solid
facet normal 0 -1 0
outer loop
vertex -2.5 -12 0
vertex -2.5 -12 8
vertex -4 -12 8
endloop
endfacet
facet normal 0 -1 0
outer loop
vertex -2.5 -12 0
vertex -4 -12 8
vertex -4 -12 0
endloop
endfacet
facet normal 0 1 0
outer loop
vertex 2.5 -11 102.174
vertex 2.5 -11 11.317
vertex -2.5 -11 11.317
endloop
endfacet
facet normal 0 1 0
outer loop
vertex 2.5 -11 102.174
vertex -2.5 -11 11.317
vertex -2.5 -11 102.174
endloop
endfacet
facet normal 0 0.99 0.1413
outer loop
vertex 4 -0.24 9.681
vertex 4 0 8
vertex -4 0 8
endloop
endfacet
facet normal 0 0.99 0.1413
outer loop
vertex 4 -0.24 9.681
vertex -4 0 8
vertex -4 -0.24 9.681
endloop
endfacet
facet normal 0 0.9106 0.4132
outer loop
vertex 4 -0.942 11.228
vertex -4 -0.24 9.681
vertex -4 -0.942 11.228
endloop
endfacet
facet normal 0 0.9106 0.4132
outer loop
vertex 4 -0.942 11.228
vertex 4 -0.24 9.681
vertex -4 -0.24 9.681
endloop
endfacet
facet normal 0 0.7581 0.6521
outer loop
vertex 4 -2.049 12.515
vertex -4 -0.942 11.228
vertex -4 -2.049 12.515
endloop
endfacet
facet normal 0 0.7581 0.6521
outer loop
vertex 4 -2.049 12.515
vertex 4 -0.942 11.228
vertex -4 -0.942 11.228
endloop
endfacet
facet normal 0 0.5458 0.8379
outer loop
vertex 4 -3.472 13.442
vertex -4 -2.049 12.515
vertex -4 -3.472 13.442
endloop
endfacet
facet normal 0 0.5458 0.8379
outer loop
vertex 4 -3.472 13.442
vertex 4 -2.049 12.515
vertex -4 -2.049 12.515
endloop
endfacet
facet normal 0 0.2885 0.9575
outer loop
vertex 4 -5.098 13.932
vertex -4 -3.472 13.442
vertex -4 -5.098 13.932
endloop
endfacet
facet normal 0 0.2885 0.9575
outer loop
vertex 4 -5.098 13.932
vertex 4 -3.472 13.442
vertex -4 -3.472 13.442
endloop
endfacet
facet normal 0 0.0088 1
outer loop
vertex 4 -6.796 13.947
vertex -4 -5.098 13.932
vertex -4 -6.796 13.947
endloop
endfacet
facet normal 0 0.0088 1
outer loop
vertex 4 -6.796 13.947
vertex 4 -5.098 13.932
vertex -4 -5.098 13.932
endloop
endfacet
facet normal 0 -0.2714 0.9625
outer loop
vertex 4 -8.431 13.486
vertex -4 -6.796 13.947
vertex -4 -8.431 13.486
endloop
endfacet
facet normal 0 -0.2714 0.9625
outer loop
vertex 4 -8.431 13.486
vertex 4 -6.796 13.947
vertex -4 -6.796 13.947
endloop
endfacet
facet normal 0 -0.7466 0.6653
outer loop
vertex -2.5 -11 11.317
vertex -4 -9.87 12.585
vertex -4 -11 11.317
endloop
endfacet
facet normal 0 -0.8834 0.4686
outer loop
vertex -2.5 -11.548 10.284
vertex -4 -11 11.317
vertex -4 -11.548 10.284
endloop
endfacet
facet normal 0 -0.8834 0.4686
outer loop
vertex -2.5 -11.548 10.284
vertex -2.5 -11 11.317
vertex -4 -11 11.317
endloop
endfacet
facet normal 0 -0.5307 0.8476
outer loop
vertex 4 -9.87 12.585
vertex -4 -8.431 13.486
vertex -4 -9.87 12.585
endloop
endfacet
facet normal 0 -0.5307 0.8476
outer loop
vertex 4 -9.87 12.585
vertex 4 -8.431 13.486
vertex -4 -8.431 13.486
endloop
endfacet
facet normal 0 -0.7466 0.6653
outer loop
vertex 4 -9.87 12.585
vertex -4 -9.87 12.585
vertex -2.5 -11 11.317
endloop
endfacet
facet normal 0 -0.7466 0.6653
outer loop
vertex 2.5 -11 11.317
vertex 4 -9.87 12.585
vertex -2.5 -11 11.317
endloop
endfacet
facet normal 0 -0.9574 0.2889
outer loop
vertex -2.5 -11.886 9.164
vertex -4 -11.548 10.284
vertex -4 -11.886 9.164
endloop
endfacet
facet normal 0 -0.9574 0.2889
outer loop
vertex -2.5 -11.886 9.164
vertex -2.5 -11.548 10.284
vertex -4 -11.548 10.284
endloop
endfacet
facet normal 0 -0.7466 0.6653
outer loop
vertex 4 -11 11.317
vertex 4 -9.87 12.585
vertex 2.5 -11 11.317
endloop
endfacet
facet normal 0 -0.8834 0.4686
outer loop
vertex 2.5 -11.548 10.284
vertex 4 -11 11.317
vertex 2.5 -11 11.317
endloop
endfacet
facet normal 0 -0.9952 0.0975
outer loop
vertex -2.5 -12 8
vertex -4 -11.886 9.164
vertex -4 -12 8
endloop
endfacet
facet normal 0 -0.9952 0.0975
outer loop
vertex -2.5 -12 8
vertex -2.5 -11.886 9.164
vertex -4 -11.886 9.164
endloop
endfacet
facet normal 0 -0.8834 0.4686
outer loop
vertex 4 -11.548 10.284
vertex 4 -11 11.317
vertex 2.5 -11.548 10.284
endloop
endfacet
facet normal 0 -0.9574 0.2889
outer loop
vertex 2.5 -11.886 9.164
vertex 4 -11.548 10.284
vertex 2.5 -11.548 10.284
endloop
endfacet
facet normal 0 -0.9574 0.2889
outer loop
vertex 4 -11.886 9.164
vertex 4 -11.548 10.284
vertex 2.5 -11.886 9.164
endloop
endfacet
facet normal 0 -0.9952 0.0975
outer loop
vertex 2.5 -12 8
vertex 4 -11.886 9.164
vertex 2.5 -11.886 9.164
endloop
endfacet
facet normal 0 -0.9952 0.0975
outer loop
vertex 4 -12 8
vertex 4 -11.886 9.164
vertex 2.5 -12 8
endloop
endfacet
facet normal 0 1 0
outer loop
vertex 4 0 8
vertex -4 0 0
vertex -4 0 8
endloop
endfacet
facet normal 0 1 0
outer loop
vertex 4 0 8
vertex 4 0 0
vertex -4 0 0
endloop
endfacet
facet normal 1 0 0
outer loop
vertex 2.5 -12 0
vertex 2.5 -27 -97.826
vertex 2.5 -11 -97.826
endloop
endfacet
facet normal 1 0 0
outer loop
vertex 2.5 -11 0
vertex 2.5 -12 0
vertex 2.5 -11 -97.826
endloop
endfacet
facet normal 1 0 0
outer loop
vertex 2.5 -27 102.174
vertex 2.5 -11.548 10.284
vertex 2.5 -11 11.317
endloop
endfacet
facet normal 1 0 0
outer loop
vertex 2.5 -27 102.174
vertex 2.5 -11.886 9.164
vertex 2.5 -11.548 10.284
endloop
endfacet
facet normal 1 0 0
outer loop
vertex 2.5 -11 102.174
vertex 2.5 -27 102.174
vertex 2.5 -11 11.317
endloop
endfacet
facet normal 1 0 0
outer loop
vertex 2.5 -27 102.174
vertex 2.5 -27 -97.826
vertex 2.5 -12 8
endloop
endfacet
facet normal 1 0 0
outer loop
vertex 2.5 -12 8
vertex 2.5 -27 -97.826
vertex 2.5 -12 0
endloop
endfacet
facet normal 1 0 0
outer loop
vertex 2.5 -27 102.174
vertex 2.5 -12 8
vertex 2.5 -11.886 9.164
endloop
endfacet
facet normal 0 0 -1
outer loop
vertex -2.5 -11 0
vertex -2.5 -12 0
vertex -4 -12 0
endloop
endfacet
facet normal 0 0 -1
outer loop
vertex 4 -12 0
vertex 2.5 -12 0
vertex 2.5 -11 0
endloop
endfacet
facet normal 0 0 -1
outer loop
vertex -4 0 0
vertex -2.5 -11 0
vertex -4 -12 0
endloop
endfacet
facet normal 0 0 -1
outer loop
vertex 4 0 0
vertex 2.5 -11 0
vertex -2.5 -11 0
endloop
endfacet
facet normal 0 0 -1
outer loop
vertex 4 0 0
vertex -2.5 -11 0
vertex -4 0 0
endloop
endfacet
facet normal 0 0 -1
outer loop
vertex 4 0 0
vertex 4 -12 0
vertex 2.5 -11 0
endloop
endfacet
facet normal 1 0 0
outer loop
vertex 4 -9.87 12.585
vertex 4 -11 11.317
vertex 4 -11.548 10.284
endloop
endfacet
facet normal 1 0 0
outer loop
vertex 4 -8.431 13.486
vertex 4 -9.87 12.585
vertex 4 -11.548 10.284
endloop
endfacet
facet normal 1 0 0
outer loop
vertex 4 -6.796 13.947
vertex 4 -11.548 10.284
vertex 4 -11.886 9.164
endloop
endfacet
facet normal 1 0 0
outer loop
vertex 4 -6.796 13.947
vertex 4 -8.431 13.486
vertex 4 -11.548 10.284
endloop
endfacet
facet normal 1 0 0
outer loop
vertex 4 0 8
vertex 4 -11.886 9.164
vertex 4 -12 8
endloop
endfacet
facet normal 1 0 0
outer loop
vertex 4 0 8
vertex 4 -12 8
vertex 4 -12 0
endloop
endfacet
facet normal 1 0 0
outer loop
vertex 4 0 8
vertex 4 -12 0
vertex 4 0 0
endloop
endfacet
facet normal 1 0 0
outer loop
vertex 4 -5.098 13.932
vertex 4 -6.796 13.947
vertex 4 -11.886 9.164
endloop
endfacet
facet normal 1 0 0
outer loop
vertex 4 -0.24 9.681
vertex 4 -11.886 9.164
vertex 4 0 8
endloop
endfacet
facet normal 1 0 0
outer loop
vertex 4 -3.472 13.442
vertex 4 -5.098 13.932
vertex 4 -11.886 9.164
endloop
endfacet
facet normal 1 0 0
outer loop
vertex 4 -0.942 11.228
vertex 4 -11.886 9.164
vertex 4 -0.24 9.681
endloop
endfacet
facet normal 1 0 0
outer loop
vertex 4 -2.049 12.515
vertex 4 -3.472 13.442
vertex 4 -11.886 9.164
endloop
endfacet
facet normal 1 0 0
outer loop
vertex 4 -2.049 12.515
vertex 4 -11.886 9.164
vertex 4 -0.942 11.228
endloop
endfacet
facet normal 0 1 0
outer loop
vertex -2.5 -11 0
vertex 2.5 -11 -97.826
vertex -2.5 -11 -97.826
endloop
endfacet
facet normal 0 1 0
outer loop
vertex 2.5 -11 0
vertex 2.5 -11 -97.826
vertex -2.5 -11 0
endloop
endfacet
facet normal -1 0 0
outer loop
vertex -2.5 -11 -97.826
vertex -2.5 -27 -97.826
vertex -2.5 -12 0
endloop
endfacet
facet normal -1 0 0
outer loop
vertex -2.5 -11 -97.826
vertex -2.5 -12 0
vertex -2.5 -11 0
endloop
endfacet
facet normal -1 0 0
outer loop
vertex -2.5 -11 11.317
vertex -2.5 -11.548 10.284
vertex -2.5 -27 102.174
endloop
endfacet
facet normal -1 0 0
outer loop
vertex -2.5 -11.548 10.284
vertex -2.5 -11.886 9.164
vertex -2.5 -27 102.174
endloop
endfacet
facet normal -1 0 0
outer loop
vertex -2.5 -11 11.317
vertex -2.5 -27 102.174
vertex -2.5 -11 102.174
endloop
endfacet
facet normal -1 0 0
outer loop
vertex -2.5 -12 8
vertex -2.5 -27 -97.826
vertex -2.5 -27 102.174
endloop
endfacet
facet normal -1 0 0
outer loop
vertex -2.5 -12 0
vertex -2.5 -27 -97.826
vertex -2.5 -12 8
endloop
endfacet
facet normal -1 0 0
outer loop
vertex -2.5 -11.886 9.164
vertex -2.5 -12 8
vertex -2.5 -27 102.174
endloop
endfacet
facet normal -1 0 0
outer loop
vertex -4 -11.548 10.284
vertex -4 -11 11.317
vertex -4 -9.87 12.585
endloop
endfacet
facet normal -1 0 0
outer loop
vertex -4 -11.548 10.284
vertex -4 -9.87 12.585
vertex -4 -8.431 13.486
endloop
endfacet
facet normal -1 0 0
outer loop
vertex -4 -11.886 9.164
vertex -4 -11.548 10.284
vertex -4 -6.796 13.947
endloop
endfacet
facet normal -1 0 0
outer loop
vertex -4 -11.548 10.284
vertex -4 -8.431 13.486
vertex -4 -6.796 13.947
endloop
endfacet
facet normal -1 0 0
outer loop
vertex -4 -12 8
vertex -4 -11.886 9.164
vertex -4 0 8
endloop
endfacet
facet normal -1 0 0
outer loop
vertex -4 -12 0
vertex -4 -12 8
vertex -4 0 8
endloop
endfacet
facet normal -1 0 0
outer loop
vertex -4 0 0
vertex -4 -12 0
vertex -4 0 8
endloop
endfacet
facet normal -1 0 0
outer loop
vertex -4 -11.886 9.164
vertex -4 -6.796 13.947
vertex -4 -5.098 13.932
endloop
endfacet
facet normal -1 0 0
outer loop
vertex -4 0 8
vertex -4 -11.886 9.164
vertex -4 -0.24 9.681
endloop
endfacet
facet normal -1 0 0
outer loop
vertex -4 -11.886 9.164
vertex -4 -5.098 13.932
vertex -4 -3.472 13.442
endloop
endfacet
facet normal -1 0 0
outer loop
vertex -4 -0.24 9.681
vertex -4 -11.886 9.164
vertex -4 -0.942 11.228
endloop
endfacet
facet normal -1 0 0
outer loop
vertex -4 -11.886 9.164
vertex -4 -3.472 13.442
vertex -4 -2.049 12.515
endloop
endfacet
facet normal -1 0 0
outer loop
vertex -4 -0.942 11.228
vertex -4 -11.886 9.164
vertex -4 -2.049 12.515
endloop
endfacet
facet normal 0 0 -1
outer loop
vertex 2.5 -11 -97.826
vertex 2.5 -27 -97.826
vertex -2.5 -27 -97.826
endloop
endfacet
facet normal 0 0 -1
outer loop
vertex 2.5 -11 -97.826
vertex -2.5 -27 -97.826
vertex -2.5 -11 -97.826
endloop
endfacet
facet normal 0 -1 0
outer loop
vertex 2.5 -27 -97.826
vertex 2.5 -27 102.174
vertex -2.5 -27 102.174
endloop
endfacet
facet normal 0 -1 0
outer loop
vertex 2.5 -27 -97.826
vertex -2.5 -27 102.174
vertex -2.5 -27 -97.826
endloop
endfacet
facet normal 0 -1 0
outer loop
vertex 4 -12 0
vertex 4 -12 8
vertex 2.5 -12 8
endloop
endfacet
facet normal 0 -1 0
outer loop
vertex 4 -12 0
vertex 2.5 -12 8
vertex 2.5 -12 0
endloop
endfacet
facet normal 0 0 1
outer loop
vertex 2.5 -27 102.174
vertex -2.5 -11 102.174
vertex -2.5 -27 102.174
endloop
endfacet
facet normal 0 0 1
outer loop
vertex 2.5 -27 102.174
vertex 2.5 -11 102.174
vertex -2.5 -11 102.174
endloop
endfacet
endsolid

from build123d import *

# Parameters (mm, degrees)
F1_DEPTH = 2.5
F2_DEPTH = 4


# Not quite as in the source:
# - a feature names something its author has since deleted; it is built from what else it names


with BuildPart() as f1:
    # F0 (on Right) → F1 (new body, symmetric)
    with BuildSketch(Plane.YZ):
        with BuildLine():
            Line((-11, 102.1741141677), (-27, 102.1741141677))
            Line((-27, 102.1741141677), (-27, -97.8258858323))
            Line((-27, -97.8258858323), (-11, -97.8258858323))
            Line((-11, -97.8258858323), (-11, 0))
            Line((-11, 0), (-12, 0))
            Line((-12, 0), (-12, 8))
            ThreePointArc((-12, 8), (-11.7445626465, 9.7320508076), (-11, 11.3166247904))
            Line((-11, 11.3166247904), (-11, 102.1741141677))
        make_face()
        with BuildLine():
            Line((-11, 0), (-11, 11.3166247904))
            ThreePointArc((-11, 11.3166247904), (-11.7445626465, 9.7320508076), (-12, 8))
            Line((-12, 8), (-12, 0))
            Line((-12, 0), (-11, 0))
        make_face()
    extrude(amount=F1_DEPTH, both=True)

    # F0 (on Right) → F2 (join, symmetric)
    with BuildSketch(Plane.YZ):
        with BuildLine():
            ThreePointArc((0, 8), (-4.2679491924, 13.7445626465), (-11, 11.3166247904))
            Line((-11, 11.3166247904), (-11, 0))
            Line((-11, 0), (0, 0))
            Line((0, 0), (0, 8))
        make_face()
        with BuildLine():
            Line((-11, 0), (-11, 11.3166247904))
            ThreePointArc((-11, 11.3166247904), (-11.7445626465, 9.7320508076), (-12, 8))
            Line((-12, 8), (-12, 0))
            Line((-12, 0), (-11, 0))
        make_face()
    extrude(amount=F2_DEPTH, both=True)


solid = f1.part
